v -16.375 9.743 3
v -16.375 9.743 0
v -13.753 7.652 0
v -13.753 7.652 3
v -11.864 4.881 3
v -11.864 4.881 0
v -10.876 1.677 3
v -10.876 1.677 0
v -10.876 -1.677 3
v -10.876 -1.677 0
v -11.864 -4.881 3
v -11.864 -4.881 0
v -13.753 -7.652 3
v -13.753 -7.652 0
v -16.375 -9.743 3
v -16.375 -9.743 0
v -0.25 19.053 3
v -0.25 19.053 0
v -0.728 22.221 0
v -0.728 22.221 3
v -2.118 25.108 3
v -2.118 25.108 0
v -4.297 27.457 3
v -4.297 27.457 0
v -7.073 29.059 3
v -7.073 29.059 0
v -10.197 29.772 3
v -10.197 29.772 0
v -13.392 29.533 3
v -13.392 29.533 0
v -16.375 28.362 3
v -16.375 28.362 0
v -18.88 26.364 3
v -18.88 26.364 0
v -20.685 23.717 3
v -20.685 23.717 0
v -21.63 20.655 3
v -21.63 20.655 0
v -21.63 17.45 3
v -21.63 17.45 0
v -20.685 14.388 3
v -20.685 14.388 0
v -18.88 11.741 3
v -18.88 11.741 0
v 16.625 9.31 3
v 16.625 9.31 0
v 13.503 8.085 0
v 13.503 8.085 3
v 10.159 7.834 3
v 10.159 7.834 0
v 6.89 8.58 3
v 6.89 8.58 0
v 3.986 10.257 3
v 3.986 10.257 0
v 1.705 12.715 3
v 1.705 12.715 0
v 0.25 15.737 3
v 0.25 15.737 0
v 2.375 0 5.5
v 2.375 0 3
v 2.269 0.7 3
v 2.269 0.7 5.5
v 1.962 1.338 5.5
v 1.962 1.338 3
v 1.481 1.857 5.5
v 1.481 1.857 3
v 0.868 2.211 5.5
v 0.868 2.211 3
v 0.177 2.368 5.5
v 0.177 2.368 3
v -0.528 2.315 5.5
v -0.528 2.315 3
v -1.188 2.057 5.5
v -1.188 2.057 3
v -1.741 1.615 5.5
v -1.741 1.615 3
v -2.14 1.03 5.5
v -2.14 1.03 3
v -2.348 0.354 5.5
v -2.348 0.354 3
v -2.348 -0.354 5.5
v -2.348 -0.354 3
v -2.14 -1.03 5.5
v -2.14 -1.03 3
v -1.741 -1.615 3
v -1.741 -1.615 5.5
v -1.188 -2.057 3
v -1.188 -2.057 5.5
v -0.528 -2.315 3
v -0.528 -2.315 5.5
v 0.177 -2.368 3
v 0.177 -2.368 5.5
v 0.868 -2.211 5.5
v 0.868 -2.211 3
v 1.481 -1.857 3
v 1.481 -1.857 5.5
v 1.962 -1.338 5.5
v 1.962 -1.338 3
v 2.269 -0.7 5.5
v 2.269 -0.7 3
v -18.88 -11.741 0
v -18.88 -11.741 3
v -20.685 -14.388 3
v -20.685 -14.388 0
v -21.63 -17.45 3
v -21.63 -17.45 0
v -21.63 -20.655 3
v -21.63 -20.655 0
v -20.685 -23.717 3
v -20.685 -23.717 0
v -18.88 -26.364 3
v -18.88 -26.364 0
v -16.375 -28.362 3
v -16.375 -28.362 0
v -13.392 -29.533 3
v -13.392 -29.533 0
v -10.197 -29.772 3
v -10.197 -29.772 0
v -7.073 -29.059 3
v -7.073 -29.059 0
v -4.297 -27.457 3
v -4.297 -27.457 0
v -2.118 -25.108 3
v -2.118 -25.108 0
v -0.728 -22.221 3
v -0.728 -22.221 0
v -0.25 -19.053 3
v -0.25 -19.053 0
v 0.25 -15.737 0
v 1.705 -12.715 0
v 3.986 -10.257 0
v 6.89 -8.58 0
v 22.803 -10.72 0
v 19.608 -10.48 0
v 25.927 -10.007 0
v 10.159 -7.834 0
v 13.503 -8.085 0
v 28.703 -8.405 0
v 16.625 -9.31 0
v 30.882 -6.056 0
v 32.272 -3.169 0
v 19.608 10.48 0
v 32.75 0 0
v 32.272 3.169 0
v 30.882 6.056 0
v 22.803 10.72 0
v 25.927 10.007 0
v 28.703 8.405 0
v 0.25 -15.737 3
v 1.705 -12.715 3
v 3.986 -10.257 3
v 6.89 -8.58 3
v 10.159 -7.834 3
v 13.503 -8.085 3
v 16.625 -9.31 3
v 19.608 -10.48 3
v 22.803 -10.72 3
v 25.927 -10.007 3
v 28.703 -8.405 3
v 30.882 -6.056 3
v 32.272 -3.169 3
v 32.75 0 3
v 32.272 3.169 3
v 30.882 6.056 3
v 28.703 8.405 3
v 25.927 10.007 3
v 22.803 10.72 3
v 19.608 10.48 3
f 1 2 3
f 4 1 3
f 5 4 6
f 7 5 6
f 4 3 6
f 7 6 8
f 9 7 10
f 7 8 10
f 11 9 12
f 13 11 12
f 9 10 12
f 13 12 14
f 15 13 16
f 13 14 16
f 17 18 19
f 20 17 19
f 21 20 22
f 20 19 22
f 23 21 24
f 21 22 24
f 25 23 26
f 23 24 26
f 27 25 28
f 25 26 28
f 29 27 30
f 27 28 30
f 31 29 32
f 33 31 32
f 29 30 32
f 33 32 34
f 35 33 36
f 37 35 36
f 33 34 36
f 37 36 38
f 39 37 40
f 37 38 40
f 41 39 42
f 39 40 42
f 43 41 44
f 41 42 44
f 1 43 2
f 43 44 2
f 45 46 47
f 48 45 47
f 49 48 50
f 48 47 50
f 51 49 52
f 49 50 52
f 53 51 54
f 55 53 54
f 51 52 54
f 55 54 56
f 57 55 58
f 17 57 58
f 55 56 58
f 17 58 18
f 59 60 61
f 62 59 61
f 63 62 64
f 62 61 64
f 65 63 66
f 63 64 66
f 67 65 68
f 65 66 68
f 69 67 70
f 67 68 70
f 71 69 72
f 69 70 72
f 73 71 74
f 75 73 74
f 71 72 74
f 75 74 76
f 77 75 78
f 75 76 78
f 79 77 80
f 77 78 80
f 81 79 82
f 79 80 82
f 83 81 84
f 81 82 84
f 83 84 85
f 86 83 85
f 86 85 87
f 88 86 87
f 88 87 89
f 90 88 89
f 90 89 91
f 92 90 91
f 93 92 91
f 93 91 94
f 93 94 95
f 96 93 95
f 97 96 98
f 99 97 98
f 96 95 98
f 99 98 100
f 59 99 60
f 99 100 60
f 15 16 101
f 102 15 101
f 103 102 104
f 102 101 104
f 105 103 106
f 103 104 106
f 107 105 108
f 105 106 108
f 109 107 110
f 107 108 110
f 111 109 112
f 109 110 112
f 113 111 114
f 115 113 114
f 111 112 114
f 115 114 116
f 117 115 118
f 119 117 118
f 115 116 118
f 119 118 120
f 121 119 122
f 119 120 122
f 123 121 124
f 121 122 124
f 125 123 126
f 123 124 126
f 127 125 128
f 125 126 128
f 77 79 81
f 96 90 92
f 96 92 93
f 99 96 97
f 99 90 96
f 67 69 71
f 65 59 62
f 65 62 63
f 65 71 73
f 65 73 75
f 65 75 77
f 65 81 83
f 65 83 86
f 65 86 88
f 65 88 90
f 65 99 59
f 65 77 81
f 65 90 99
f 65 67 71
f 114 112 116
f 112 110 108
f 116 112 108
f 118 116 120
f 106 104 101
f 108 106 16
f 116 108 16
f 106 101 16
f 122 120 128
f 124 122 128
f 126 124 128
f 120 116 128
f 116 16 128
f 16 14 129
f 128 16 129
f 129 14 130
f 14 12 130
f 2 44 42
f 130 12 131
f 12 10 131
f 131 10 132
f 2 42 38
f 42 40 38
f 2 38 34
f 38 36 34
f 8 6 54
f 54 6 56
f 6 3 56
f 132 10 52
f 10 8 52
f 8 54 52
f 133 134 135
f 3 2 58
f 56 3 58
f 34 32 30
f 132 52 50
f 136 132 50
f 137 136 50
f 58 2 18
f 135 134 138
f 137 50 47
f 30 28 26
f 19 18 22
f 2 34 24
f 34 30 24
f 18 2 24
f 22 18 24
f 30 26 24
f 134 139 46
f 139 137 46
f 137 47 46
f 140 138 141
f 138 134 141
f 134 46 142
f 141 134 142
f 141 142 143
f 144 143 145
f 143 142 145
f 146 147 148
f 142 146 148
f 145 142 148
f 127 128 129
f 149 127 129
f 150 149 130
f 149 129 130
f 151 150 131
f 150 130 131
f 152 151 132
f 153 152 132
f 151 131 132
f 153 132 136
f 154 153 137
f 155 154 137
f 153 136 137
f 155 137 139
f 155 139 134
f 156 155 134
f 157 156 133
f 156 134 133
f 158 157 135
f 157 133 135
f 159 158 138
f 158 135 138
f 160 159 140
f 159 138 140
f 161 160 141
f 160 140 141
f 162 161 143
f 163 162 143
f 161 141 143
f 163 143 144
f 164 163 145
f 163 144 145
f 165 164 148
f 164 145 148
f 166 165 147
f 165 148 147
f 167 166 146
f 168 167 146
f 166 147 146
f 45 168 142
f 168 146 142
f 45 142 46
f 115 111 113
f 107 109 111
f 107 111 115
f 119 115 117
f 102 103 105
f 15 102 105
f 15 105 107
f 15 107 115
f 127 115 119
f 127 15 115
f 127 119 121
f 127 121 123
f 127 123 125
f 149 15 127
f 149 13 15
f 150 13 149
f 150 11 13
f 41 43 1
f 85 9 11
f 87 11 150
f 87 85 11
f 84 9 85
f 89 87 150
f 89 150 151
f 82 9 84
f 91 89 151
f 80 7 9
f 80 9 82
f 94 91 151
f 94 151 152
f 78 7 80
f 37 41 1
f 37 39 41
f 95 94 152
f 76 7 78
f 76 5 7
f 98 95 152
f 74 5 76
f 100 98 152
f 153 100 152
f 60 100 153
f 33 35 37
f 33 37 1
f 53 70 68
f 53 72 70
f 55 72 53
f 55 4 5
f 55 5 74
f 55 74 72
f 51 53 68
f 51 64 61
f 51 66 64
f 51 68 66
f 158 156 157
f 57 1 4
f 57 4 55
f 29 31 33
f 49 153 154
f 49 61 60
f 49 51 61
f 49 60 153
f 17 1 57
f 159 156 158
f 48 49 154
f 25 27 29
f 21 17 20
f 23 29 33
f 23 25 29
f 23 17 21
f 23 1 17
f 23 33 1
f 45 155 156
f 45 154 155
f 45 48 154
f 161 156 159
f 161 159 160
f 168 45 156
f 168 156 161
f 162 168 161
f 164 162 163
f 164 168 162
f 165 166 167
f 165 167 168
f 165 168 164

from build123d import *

# Parameters (mm, degrees)
F1_DEPTH = 3
F2_R     = 2.375
F3_DEPTH = 2.5


with BuildPart() as f1:
    # F0 (on Top) → F1 (new body)
    with BuildSketch(Plane.XY):
        with BuildLine():
            ThreePointArc((16.625, -9.309773), (32.75, 0), (16.625, 9.309773))
            ThreePointArc((16.625, 9.309773), (5.375, 9.309773), (-0.25, 19.052559))
            ThreePointArc((-0.25, 19.052559), (-16.375, 28.362332), (-16.375, 9.742786))
            ThreePointArc((-16.375, 9.742786), (-10.75, 0), (-16.375, -9.742786))
            ThreePointArc((-16.375, -9.742786), (-16.375, -28.362332), (-0.25, -19.052559))
            ThreePointArc((-0.25, -19.052559), (5.375, -9.309773), (16.625, -9.309773))
        make_face()
    extrude(amount=F1_DEPTH)

    # F2 (on face) → F3 (join)
    with BuildSketch(Plane.XY.offset(3)):
        Circle(F2_R)
    extrude(amount=F3_DEPTH)


solid = f1.part
